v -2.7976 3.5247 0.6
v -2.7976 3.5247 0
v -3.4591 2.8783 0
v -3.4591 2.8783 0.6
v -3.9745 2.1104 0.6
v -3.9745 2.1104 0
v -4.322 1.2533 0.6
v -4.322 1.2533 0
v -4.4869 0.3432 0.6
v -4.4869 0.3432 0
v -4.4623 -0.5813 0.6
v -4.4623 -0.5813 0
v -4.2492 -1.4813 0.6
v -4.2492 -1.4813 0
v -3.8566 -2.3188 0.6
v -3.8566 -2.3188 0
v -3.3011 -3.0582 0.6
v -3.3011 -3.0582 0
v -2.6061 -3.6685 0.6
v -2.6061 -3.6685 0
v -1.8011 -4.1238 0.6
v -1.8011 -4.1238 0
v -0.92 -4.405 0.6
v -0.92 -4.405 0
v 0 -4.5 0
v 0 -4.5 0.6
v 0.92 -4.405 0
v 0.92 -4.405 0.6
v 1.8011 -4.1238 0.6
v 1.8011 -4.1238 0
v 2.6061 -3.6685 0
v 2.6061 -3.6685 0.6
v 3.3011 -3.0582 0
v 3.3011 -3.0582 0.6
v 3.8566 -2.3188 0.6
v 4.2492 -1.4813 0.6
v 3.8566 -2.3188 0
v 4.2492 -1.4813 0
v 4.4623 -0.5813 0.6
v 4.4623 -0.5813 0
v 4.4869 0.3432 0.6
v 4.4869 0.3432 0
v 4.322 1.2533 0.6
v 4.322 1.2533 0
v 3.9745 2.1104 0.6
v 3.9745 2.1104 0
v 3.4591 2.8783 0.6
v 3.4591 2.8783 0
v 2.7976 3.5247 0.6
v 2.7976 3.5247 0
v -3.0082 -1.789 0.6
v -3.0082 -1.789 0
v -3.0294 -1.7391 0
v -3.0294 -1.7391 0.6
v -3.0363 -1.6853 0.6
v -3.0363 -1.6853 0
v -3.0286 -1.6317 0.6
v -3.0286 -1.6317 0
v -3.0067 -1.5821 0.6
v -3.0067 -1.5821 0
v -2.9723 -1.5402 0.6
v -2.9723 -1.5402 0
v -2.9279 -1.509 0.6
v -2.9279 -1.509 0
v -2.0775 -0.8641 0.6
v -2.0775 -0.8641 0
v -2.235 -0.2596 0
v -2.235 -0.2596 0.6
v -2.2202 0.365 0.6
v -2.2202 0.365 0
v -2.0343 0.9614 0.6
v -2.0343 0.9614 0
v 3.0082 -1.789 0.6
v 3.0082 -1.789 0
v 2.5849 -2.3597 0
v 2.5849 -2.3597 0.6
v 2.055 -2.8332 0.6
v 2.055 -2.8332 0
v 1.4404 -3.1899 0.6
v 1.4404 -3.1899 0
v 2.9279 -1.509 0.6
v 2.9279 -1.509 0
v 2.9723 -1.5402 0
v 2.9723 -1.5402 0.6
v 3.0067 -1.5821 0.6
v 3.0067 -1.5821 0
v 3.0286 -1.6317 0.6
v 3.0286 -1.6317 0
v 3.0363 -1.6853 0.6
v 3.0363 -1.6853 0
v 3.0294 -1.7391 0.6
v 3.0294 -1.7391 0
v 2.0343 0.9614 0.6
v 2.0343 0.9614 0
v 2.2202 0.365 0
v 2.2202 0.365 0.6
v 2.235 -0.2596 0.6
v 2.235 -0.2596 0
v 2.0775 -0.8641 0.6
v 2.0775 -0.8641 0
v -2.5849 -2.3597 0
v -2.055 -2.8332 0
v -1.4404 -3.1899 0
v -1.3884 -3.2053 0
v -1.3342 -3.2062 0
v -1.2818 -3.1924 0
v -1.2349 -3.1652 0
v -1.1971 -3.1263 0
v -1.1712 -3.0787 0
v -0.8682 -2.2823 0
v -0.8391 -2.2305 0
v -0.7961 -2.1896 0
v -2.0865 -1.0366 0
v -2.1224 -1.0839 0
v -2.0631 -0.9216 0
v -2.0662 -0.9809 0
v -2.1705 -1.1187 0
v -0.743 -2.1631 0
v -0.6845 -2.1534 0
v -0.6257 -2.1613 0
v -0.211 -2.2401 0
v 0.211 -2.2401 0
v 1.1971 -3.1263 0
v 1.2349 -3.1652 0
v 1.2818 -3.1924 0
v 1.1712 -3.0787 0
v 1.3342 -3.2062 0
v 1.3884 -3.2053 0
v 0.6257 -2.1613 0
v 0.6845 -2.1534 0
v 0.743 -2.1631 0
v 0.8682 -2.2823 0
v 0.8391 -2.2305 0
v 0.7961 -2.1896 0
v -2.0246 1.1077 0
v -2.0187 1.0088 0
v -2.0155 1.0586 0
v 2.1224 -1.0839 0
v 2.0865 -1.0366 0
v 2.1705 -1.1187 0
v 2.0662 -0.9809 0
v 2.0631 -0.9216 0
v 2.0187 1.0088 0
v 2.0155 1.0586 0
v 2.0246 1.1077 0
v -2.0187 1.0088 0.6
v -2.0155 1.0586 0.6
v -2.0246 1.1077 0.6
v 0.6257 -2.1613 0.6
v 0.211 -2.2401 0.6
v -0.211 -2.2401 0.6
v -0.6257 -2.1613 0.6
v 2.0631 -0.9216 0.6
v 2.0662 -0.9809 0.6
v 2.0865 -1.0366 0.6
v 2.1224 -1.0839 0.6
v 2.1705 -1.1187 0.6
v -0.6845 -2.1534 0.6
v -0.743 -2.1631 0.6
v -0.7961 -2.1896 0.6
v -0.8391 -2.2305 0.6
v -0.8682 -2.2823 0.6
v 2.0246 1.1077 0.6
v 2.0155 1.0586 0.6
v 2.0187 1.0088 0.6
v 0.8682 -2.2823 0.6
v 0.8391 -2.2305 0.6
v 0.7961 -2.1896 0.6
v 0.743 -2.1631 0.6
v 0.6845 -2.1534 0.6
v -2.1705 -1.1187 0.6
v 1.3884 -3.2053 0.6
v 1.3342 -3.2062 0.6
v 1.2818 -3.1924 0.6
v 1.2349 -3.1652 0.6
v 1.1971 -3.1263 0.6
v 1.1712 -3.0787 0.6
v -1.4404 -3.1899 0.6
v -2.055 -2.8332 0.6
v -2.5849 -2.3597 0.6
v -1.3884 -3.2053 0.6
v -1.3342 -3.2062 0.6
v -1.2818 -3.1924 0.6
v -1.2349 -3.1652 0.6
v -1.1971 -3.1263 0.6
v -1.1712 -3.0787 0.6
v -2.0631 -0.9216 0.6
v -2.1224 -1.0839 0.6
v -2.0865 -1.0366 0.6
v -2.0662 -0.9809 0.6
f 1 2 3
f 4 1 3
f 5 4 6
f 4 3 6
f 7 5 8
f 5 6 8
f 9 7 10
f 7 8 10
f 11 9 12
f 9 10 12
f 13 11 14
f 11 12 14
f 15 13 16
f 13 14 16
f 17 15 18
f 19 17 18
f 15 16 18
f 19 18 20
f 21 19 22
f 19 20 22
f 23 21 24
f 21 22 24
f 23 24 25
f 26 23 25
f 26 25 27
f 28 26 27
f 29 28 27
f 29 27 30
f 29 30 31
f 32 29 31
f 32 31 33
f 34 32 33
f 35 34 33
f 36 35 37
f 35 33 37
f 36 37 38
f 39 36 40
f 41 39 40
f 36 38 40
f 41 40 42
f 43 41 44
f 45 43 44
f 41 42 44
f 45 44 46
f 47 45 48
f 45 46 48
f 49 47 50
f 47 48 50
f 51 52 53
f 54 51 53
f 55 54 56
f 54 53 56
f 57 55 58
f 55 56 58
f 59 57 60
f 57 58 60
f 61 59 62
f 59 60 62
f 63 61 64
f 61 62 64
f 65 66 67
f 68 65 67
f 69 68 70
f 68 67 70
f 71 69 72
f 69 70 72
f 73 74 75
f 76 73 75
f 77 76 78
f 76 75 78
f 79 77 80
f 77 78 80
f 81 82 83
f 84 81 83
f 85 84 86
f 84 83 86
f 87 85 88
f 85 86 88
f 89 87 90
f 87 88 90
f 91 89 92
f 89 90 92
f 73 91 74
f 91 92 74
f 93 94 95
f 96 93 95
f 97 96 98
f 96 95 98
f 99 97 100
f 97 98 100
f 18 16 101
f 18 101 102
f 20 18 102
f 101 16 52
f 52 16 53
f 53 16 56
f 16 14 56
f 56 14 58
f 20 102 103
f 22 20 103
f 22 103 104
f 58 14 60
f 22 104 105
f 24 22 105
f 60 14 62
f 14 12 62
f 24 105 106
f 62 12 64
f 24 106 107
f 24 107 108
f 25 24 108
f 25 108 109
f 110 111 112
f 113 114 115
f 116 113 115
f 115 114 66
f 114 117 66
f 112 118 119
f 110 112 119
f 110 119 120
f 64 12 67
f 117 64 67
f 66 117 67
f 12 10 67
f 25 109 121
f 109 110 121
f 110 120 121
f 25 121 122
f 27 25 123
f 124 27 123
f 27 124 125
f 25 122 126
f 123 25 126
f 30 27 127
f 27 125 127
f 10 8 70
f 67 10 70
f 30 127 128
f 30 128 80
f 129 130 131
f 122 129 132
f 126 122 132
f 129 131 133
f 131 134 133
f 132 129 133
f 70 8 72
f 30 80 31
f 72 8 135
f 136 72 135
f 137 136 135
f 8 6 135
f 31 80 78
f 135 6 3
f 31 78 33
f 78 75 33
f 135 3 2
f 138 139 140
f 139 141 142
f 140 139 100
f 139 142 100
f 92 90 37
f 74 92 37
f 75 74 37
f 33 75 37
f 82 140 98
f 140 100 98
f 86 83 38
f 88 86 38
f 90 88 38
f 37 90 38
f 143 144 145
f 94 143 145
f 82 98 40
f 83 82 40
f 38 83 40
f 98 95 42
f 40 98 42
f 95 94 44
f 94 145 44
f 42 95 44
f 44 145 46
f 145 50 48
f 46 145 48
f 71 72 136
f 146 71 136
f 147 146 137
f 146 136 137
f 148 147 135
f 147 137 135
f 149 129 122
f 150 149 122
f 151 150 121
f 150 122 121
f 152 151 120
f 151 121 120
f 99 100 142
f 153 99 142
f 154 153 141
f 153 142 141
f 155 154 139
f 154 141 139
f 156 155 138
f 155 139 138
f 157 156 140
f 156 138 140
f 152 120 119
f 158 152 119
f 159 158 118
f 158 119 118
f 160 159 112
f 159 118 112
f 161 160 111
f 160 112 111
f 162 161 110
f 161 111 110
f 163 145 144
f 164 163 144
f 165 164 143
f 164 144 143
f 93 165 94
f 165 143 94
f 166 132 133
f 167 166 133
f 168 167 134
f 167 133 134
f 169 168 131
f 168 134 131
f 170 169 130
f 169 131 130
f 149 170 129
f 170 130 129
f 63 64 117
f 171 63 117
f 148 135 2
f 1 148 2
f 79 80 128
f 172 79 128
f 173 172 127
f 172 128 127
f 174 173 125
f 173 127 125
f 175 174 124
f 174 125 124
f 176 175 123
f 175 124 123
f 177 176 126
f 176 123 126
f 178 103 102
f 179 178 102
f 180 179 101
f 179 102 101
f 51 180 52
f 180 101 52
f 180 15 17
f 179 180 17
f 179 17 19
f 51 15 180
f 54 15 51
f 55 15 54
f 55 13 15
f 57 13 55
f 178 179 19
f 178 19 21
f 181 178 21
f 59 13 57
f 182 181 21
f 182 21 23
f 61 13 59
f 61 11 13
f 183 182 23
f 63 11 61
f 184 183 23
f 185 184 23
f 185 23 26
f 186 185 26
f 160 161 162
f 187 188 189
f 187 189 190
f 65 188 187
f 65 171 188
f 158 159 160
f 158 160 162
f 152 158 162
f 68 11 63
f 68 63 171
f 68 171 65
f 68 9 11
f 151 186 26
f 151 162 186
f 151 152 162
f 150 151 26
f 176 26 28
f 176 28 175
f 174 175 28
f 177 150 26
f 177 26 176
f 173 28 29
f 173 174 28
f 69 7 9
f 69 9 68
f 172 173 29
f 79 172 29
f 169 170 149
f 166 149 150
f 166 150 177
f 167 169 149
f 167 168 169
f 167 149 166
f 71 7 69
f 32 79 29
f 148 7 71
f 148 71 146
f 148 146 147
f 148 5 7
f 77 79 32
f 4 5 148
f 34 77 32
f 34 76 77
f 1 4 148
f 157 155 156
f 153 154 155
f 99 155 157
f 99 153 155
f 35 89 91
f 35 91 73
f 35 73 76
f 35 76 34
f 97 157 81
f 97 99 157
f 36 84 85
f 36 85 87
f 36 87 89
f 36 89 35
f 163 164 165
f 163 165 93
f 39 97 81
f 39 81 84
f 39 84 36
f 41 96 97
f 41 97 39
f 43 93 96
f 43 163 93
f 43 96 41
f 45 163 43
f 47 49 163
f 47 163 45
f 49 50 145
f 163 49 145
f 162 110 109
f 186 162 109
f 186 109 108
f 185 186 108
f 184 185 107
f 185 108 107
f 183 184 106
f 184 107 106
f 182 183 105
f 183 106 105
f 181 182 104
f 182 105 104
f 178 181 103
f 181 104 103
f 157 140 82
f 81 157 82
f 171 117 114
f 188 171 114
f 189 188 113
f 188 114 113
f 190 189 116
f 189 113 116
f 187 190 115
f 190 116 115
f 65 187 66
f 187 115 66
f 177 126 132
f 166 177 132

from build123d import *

# Parameters (mm, degrees)
BOSS_EXTRUDE1_DEPTH = 0.6


with BuildPart() as part:
    # Sketch1 → Boss-Extrude1 (new body)
    with BuildSketch(Plane.XY):
        with BuildLine():
            Line((2.7975505, 3.524728529), (2.024608864, 1.107728687))
            ThreePointArc((2.024608864, 1.107728687), (2.015540231, 1.033623325), (2.034280186, 0.961355359))
            ThreePointArc((2.034280186, 0.961355359), (2.249370488, 0.053220369), (2.077469984, -0.864070869))
            ThreePointArc((2.077469984, -0.864070869), (2.074285356, -1.009527687), (2.170509413, -1.118654946))
            Line((2.170509413, -1.118654946), (2.927941172, -1.50902634))
            ThreePointArc((2.927941172, -1.50902634), (3.02857216, -1.63168787), (3.008214578, -1.78903467))
            ThreePointArc((3.008214578, -1.78903467), (2.331985815, -2.609950605), (1.440417044, -3.189858734))
            ThreePointArc((1.440417044, -3.189858734), (1.281779829, -3.192443437), (1.171176469, -3.078692203))
            Line((1.171176469, -3.078692203), (0.868203765, -2.282262523))
            ThreePointArc((0.868203765, -2.282262523), (0.770555129, -2.174408123), (0.625658635, -2.1612615))
            ThreePointArc((0.625658635, -2.1612615), (0, -2.25), (-0.625658635, -2.1612615))
            ThreePointArc((-0.625658635, -2.1612615), (-0.770555129, -2.174408123), (-0.868203765, -2.282262523))
            Line((-0.868203765, -2.282262523), (-1.171176469, -3.078692203))
            ThreePointArc((-1.171176469, -3.078692203), (-1.281779829, -3.192443437), (-1.440417044, -3.189858734))
            ThreePointArc((-1.440417044, -3.189858734), (-2.331985815, -2.609950605), (-3.008214578, -1.78903467))
            ThreePointArc((-3.008214578, -1.78903467), (-3.02857216, -1.63168787), (-2.927941172, -1.50902634))
            Line((-2.927941172, -1.50902634), (-2.170509413, -1.118654946))
            ThreePointArc((-2.170509413, -1.118654946), (-2.074285356, -1.009527687), (-2.077469984, -0.864070869))
            ThreePointArc((-2.077469984, -0.864070869), (-2.249370488, 0.053220369), (-2.034280186, 0.961355359))
            ThreePointArc((-2.034280186, 0.961355359), (-2.015540231, 1.033623325), (-2.024608864, 1.107728687))
            Line((-2.024608864, 1.107728687), (-2.7975505, 3.524728529))
            ThreePointArc((-2.7975505, 3.524728529), (0, -4.5), (2.7975505, 3.524728529))
        make_face()
    extrude(amount=BOSS_EXTRUDE1_DEPTH)


solid = part.part
